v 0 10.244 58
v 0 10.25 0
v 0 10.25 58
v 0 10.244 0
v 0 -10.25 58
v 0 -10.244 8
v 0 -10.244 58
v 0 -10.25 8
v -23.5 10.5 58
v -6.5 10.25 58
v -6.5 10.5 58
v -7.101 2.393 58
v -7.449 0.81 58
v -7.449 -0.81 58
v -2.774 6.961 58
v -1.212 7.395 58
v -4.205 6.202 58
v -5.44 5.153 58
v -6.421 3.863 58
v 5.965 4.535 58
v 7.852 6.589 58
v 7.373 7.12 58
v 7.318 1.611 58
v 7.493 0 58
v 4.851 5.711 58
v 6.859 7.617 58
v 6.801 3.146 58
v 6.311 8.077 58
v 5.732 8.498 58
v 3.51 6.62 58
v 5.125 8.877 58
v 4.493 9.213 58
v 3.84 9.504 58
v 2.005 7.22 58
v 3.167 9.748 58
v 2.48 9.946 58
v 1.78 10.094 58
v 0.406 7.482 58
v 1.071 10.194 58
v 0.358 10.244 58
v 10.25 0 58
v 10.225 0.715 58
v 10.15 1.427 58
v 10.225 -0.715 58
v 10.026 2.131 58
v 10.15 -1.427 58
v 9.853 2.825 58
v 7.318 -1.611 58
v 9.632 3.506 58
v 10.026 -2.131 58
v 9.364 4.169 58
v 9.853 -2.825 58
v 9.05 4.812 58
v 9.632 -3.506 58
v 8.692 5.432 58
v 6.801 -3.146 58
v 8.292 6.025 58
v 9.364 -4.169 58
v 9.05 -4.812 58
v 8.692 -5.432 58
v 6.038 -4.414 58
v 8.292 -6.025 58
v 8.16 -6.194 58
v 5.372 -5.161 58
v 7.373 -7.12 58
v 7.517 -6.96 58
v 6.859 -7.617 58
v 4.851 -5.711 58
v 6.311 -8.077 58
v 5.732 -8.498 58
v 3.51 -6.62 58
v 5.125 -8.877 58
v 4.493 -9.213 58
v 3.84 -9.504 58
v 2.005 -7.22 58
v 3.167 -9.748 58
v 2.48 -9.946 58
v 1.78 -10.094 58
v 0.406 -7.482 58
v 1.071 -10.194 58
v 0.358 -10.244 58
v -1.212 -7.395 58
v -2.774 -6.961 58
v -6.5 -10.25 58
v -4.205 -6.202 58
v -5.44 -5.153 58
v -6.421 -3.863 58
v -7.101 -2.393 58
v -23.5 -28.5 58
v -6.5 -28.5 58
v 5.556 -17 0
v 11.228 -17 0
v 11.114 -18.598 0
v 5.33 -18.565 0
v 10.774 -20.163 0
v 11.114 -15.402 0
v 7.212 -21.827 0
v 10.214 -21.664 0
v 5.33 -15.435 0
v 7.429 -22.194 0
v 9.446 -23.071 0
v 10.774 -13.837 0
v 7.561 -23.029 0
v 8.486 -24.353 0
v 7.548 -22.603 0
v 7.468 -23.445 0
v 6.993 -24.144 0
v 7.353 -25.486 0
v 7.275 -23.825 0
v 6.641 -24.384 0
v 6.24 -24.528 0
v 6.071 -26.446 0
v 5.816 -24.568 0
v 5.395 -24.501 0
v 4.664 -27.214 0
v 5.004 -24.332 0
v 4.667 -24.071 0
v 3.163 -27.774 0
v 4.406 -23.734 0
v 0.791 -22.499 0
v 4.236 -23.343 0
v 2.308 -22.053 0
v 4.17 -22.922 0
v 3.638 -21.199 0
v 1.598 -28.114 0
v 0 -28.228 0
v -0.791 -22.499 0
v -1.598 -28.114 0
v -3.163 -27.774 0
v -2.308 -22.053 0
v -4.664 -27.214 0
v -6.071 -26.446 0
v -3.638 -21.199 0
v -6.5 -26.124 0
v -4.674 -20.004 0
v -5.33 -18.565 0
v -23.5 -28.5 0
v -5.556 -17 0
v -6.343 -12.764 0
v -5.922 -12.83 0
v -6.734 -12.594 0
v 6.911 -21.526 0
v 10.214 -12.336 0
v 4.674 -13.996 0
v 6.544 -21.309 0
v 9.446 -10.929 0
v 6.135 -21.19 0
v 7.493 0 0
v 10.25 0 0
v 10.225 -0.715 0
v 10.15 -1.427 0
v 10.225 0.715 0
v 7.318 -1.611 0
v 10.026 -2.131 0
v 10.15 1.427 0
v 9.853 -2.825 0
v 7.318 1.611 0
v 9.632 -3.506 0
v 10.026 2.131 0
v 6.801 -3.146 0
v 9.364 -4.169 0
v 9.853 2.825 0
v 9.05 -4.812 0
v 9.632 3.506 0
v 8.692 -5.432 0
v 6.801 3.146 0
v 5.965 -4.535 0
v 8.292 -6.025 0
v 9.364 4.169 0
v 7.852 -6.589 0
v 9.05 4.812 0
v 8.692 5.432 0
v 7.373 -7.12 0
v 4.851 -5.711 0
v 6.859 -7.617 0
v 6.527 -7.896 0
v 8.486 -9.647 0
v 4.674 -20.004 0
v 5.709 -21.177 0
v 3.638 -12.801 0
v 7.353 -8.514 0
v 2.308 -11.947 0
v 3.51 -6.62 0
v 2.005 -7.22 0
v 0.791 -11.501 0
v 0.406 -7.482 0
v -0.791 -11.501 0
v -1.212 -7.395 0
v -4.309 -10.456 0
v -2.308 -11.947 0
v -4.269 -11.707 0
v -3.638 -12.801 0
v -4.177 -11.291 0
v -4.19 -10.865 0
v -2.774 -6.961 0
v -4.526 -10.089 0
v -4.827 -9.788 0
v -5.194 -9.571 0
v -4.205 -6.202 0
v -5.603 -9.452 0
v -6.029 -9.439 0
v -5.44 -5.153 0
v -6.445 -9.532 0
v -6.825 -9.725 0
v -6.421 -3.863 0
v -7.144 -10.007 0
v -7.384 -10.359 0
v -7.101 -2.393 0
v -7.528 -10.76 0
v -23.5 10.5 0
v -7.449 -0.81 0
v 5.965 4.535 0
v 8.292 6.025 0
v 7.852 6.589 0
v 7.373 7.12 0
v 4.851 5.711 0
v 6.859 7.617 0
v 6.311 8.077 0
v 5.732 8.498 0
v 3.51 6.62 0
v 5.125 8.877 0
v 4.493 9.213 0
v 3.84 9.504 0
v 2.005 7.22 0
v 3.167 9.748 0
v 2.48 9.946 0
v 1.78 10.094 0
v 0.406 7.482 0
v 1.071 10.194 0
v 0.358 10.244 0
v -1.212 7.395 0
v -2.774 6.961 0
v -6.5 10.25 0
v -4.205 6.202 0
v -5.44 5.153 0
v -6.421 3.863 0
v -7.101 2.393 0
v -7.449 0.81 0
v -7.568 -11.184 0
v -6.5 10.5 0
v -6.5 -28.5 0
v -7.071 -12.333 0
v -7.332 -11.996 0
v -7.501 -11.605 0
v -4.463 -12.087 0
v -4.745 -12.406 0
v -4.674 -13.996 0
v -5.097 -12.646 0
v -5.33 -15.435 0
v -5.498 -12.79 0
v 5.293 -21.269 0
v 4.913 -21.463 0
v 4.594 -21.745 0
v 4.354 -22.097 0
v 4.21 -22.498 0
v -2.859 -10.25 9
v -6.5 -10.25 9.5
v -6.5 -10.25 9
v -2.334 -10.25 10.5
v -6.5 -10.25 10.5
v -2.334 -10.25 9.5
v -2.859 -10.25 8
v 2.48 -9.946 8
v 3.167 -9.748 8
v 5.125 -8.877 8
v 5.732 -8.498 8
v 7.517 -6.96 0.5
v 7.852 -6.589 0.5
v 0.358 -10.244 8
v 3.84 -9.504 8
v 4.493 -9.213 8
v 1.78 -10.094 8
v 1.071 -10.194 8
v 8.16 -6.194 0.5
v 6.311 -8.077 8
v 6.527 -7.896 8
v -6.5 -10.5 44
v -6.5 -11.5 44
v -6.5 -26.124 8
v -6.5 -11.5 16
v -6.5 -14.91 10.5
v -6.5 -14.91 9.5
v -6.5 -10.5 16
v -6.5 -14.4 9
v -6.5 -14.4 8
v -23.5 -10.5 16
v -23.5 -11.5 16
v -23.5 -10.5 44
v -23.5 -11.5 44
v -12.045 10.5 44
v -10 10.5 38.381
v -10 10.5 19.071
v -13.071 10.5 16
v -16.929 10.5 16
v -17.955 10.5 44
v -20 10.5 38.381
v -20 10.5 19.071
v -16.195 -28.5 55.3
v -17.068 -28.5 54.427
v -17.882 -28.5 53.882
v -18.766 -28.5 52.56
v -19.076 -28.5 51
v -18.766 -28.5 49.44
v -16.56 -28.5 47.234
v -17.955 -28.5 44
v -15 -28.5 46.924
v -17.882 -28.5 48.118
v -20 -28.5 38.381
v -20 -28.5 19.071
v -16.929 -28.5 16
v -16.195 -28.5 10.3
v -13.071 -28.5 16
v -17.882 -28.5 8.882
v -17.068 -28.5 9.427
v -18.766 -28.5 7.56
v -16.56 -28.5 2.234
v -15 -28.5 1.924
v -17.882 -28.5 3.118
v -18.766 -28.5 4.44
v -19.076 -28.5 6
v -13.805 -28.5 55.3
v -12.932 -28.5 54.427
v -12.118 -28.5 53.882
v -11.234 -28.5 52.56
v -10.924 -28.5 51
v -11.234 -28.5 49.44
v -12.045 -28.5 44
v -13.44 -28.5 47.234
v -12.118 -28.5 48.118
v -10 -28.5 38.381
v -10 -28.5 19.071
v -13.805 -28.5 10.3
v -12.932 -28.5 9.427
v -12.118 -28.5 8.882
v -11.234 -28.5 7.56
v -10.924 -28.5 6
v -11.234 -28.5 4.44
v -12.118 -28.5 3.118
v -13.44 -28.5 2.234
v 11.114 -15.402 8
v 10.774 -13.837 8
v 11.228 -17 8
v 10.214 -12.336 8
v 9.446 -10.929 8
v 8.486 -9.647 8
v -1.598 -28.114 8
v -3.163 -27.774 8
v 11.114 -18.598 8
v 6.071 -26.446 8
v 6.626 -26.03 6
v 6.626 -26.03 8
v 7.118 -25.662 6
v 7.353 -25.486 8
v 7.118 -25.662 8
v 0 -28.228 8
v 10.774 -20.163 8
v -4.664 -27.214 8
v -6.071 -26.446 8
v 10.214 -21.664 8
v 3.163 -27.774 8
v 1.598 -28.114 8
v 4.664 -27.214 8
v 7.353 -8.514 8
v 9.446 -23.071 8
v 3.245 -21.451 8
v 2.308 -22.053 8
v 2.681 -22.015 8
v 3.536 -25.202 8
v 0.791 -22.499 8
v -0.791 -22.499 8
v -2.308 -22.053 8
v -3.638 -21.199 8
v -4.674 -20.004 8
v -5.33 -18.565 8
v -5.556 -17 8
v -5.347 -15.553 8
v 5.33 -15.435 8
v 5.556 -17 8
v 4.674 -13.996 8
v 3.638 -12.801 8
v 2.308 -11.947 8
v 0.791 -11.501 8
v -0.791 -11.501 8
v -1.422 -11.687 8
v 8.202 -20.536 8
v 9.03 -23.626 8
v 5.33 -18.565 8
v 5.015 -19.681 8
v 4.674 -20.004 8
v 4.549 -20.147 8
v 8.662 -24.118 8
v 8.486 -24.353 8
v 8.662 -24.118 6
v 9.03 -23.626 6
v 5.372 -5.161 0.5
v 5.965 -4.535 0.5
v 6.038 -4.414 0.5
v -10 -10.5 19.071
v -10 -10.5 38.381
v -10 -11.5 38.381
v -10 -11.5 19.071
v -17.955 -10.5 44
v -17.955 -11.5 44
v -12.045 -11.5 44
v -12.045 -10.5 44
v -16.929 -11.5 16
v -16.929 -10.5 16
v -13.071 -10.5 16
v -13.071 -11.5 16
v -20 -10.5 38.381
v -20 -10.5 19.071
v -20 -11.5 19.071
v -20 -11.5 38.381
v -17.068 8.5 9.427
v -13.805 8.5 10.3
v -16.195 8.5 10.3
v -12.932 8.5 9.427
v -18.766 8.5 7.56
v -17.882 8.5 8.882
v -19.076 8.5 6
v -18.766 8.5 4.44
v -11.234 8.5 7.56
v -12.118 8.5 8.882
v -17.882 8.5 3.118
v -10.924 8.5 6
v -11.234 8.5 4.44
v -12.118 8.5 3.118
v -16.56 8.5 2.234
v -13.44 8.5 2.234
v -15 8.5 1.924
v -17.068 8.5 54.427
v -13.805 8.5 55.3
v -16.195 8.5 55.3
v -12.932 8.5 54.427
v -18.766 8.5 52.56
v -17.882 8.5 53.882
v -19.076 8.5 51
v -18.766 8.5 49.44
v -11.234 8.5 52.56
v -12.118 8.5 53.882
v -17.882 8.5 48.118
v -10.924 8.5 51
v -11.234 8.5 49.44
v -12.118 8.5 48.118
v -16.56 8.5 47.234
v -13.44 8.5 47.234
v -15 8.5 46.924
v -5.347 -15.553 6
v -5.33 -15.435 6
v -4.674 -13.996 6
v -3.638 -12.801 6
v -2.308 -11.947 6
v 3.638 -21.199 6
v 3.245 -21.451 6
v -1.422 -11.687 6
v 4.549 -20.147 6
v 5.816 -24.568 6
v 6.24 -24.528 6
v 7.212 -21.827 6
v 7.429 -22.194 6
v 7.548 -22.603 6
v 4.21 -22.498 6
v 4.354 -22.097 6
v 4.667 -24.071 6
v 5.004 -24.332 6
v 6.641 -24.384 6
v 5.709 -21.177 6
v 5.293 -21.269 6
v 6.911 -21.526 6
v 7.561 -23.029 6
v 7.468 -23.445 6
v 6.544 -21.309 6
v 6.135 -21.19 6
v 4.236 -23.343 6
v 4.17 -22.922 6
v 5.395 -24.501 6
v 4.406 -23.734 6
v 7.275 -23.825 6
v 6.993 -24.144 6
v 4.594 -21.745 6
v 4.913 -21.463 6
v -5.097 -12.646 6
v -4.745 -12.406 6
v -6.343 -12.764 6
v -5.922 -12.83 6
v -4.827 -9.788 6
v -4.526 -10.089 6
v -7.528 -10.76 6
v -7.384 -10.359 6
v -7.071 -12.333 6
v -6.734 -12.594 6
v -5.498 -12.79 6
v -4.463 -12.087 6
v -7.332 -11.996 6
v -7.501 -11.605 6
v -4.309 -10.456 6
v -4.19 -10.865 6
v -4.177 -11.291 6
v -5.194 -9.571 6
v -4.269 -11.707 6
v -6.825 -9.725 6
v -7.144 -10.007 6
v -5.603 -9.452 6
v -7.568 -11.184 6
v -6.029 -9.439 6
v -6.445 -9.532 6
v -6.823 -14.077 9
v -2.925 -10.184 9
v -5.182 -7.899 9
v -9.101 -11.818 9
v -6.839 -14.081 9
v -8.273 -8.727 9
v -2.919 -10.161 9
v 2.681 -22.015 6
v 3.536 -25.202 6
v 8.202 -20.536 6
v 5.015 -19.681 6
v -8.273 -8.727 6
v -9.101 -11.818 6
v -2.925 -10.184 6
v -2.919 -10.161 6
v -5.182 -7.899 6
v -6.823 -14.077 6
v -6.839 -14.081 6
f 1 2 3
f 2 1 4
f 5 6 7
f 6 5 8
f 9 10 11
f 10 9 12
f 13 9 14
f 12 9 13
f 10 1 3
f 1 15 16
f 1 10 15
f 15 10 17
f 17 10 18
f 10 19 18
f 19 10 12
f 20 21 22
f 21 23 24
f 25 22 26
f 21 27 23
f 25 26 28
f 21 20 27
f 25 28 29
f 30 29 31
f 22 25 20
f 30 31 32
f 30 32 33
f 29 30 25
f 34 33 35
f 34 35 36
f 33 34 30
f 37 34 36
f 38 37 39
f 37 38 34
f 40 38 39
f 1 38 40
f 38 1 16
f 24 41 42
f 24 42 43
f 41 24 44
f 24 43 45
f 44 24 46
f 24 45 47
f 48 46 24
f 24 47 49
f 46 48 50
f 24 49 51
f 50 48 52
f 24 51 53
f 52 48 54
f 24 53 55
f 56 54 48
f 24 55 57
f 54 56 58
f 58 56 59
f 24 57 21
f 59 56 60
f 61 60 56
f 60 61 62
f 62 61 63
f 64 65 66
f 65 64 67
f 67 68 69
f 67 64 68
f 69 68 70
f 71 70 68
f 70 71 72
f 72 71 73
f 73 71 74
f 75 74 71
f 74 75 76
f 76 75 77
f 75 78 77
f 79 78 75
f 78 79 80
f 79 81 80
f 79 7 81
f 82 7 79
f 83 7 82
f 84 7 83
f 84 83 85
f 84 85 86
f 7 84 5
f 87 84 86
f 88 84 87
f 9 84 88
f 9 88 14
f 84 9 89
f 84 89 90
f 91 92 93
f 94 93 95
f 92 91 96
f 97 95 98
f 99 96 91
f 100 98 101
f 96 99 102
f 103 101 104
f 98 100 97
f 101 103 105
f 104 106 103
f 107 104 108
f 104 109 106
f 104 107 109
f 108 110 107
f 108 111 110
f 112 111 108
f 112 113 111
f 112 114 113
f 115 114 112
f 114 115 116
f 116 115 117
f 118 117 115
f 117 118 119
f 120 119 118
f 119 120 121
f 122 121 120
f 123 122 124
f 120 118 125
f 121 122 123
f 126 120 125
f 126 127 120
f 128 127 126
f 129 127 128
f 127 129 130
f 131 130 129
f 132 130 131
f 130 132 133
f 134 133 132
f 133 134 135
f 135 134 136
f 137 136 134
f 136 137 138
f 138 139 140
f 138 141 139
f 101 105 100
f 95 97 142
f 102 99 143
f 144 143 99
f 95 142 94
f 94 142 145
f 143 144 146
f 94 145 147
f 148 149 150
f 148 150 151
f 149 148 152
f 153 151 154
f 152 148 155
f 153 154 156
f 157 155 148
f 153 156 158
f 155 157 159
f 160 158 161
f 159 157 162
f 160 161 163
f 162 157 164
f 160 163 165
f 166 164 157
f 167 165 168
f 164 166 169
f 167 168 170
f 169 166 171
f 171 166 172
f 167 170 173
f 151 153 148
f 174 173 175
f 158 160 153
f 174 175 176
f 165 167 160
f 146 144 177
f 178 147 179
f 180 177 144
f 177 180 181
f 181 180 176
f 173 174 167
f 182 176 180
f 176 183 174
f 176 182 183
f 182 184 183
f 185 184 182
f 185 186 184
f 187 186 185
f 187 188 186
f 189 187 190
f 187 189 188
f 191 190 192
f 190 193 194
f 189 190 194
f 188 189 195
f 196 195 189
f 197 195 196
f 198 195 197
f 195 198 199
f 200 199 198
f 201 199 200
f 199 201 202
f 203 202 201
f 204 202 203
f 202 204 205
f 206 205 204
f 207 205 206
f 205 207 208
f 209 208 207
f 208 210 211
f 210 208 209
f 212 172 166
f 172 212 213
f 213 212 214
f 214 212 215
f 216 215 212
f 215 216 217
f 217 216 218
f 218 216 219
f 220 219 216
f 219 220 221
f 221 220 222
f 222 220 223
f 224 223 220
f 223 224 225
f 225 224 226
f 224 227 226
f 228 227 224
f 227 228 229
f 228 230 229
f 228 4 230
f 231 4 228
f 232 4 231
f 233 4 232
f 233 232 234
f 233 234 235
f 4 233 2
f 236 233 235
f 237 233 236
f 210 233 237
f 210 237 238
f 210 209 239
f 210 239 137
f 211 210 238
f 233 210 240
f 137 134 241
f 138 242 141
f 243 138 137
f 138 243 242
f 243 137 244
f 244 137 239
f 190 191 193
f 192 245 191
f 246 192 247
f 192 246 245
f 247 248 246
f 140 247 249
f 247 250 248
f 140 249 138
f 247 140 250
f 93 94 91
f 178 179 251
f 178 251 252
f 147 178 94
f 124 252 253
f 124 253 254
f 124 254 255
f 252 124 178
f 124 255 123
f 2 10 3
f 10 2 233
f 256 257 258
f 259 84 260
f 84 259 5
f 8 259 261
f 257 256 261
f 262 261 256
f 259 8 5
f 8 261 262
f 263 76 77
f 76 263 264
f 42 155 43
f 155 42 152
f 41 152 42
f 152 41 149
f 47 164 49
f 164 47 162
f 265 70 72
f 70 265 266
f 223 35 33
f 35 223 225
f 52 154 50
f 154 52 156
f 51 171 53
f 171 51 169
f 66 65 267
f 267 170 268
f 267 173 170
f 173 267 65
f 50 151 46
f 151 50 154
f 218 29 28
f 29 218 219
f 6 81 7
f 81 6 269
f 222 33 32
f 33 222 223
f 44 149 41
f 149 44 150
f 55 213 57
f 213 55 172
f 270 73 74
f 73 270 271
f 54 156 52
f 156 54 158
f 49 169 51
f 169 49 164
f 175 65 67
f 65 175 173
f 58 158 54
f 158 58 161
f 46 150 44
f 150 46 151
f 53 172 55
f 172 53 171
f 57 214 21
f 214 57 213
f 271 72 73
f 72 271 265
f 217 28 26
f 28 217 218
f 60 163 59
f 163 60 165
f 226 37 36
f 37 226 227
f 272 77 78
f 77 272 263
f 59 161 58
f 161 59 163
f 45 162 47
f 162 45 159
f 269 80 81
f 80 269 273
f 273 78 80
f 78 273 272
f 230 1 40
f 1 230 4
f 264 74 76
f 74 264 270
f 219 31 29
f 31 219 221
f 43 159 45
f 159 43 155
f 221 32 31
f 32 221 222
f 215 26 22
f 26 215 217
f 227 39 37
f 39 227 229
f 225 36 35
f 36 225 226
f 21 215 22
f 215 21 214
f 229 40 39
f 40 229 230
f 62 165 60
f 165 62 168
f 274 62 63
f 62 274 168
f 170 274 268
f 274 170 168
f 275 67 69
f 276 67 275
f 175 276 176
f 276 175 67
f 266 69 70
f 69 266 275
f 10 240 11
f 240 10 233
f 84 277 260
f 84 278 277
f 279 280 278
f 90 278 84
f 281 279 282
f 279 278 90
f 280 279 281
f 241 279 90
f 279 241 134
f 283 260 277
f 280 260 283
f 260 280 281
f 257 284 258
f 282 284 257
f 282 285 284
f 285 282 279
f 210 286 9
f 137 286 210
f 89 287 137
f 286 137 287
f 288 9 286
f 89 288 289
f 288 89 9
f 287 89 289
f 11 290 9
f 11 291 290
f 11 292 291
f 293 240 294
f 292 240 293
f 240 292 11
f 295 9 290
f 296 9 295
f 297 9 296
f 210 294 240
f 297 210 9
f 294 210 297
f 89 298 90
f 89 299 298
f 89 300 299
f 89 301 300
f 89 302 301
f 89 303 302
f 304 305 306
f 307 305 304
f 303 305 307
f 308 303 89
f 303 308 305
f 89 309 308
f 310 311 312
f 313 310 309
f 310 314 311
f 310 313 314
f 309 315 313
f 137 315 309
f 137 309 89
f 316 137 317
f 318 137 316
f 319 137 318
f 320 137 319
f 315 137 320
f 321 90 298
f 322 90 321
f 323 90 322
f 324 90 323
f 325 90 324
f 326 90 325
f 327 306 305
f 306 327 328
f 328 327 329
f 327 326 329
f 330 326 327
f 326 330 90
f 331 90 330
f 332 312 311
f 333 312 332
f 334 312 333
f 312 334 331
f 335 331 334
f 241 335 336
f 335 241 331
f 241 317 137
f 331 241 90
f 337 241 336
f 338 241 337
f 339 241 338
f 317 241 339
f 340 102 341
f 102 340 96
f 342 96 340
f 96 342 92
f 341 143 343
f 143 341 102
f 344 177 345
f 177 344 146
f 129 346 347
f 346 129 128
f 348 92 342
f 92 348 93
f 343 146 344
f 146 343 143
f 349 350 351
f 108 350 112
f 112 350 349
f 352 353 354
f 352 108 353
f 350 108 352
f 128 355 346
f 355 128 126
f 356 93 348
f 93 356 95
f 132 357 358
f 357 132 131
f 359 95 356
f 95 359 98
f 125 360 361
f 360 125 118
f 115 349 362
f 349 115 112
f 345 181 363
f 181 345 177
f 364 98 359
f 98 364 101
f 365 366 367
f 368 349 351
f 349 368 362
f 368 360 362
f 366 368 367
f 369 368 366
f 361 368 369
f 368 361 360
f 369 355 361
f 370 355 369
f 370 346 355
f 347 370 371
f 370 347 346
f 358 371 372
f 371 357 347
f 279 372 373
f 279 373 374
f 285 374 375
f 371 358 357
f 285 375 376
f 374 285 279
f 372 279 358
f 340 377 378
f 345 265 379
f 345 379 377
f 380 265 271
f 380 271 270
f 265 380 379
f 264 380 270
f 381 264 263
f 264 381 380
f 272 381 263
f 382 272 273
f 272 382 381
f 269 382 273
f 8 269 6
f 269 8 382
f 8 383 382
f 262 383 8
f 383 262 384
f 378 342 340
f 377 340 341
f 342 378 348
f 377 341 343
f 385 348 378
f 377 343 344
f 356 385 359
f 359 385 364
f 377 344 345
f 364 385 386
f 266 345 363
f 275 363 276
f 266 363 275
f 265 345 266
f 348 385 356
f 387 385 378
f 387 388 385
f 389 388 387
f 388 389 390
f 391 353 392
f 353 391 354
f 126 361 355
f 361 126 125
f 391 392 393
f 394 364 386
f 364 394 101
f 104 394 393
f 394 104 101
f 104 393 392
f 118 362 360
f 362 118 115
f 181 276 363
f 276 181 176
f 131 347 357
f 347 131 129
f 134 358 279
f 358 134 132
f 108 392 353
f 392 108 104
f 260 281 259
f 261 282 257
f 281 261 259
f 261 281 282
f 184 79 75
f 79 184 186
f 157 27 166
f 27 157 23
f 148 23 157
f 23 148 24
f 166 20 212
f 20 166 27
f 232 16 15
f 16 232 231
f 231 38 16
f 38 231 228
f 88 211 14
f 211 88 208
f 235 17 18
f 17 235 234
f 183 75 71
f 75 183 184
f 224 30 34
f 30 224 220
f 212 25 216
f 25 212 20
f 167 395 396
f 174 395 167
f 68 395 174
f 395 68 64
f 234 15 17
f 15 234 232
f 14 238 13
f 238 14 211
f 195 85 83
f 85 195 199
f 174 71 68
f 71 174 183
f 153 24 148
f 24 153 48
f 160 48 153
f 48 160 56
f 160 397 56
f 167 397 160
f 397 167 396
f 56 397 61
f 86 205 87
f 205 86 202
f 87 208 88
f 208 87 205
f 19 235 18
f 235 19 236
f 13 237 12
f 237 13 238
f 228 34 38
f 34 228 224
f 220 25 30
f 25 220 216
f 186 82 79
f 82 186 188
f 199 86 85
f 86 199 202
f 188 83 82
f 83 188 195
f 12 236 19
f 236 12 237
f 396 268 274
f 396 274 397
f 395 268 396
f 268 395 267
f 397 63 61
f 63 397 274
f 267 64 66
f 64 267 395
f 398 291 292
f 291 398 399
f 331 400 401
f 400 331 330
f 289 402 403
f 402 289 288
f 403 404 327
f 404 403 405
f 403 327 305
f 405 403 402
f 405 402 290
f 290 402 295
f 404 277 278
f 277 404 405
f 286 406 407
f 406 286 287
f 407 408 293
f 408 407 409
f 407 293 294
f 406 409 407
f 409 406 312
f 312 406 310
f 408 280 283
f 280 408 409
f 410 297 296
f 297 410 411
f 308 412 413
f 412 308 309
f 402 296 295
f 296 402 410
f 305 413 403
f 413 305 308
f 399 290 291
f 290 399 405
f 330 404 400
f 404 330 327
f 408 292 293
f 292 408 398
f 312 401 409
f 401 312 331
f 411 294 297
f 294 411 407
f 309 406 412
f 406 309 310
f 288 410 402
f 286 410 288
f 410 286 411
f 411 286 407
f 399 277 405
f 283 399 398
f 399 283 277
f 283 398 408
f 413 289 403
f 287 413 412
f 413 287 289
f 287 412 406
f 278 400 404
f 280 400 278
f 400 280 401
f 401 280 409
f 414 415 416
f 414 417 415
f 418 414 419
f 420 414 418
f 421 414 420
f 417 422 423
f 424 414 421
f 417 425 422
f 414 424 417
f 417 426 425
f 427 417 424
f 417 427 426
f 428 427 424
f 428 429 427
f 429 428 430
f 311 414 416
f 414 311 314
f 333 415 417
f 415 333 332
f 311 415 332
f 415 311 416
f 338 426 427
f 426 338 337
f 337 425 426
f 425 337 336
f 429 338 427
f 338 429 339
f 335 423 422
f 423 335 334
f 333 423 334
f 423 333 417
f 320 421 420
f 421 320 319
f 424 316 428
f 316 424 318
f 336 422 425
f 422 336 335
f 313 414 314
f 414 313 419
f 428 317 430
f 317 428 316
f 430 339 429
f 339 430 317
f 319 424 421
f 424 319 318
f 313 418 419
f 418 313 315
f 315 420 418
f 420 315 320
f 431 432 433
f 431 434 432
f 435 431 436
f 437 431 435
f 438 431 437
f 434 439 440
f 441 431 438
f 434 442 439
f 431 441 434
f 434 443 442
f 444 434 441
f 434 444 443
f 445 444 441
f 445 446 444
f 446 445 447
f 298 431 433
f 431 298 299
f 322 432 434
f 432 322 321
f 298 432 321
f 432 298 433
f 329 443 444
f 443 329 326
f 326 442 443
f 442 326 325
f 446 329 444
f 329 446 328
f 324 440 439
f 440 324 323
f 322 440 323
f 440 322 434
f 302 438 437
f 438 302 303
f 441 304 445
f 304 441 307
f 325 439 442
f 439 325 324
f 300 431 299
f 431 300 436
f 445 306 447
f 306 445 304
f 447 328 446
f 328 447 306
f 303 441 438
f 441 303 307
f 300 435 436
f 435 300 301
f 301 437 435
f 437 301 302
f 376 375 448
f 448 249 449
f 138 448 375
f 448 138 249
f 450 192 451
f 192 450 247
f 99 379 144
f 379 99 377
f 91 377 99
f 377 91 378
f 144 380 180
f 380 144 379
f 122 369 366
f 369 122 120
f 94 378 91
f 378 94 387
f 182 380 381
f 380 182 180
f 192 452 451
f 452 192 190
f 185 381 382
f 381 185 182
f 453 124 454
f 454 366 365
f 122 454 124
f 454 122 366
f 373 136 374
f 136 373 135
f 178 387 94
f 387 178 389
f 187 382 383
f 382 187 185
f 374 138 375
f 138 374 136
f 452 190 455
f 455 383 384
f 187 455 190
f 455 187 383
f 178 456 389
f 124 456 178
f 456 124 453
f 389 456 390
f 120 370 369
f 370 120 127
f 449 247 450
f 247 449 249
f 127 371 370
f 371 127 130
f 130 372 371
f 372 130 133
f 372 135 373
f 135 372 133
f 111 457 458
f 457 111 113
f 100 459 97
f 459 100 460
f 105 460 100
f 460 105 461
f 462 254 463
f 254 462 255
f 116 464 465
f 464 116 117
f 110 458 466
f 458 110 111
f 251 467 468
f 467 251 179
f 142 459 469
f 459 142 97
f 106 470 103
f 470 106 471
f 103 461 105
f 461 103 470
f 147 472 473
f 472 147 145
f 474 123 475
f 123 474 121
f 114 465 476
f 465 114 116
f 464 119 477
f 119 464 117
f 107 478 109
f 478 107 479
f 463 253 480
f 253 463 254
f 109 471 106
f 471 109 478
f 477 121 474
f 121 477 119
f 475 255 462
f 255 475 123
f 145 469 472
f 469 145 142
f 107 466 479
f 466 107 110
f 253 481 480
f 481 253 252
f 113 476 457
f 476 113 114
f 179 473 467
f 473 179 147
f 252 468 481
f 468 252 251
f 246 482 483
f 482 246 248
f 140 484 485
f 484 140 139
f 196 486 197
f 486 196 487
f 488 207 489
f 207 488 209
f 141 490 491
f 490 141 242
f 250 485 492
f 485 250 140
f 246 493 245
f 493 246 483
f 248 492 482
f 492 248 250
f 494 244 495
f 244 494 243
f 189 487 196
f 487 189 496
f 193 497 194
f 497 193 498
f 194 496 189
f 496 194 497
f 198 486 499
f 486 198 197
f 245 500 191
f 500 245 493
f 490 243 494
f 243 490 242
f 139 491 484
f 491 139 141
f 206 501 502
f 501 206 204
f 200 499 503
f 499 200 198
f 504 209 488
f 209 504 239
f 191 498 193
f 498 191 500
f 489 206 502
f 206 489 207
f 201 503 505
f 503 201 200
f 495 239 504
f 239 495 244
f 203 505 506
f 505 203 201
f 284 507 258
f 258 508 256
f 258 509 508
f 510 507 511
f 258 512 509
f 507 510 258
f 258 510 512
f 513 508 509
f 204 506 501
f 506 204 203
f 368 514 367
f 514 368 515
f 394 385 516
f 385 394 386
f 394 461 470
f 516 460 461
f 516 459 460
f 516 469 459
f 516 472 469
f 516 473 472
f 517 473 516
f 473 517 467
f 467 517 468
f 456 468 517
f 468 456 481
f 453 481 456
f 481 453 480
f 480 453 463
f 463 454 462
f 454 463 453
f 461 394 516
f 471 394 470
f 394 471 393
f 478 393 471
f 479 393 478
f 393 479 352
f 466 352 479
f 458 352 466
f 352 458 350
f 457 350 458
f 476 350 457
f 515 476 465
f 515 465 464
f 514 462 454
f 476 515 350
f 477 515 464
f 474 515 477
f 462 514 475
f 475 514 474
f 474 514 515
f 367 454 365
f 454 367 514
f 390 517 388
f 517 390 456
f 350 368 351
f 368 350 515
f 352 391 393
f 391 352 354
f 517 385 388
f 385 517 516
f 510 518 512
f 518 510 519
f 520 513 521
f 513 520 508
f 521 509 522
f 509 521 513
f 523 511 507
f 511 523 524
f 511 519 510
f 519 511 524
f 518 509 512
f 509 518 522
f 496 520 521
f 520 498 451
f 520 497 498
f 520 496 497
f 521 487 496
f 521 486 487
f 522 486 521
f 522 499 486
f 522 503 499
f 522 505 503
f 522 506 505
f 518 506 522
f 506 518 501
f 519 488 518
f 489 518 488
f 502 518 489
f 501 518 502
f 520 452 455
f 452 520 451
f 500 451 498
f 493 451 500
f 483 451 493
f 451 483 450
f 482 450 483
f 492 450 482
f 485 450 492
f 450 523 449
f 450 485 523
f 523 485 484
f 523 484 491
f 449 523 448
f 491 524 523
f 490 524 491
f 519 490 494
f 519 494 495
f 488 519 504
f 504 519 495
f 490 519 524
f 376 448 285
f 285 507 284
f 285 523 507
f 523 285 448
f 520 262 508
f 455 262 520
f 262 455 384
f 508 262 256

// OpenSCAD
// file: polyholes.scad
//Original Prusa

//
// Mendel90
//
// GNU GPL v2
// nop.head@gmail.com
// hydraraptor.blogspot.com
//
// See http://hydraraptor.blogspot.com/2011/02/polyholes.html
//
function sides(r) = max(round(4 *r),3);
function correctedRadius(r,n) = 0.1 + r / cos(180 / n);
function correctedDiameter(d) = 0.2 + d / cos(180 / sides(d / 2));

module polyCircle(r, center = false) {
    n = sides(r);
    circle(r = correctedRadius(r,n), $fn = n, center = center);
}

module poly_circle(r, center = false) {
	polyCircle(r, center);
}

module polyCylinder(r, h, center = false) {
    n = sides(r);
    cylinder(h = h, r = correctedRadius(r,n), $fn = n, center = center);
}

module poly_cylinder(r, h, center = false) {
	polyCylinder(r,h,center);
}

module polydCylinder(r, center = false) {
    n = sides(r);
    r = correctedRadius(r,n);
    cylinder(h = h, r = r, $fn = n, center = center);
    translate([0, -r, 0])
        cube([r, 2 * r, h]);
}

module poly_d_cylinder(r, center = false) {
	polydCylinder(r,center);
}
// file: bearing.scad
//Original Prusa

// PRUSA iteration3
// Bearing holders
// GNU GPL v3
// Josef Průša <iam@josefprusa.cz> and contributors
// http://www.reprap.org/wiki/Prusa_Mendel
// http://prusamendel.org

use <polyholes.scad>

bearing_diameter = 14.5;

module horizontal_bearing_base(bearings=1){
 translate(v=[0,0,6]) cube(size = [24,8+bearings*25,12], center = true);	
}
module horizontal_bearing_holes(bearings=1){
 cutter_lenght = 10+bearings*25;
 one_holder_lenght = 8+25;
 holder_lenght = 8+bearings*25;
 
 // Main bearing cut
 difference(){
  translate(v=[0,0,12]) rotate(a=[90,0,0]) translate(v=[0,0,-cutter_lenght/2]) cylinder(h = cutter_lenght, r=(bearing_diameter/2)+0.2, $fn=50);
  // Bearing retainers
  translate(v=[0,1-holder_lenght/2,3]) cube(size = [24,6,8], center = true);
  translate(v=[0,-1+holder_lenght/2,3]) cube(size = [24,6,8], center = true);
 }
 
 // Ziptie cutouts
 ziptie_cut_ofset = 0;
 for ( i = [0 : bearings-1] ){
  // For easier positioning I move them by half of one 
  // bearing holder then add each bearign lenght and then center again
  translate(v=[0,-holder_lenght/2,0]) translate(v=[0,one_holder_lenght/2+i*25,0]) difference(){
   union(){
    translate(v=[0,2-8.5,12]) rotate(a=[90,0,0]) translate(v=[0,0,0]) cylinder(h = 4, r=11.5, $fn=50);
    translate(v=[0,2+8.5,12]) rotate(a=[90,0,0]) translate(v=[0,0,0]) cylinder(h = 4, r=11.5, $fn=50);
   }
   translate(v=[0,12,12]) rotate(a=[90,0,0]) translate(v=[0,0,0]) cylinder(h = 24, r=9, $fn=50);
  }
 }
 
}

module horizontal_bearing_test(){
 difference(){
  horizontal_bearing_base(1);
  horizontal_bearing_holes(1);
 }
 translate(v=[30,0,0]) difference(){
  horizontal_bearing_base(2);
  #horizontal_bearing_holes(2);
 }
 translate(v=[60,0,0]) difference(){
  horizontal_bearing_base(3);
  horizontal_bearing_holes(3);
 }
}



thinwall = 3;
bearing_size = bearing_diameter + 2 * thinwall;

module vertical_bearing_base(){
 translate(v=[-2-bearing_size/4,0,29]) cube(size = [4+bearing_size/2,bearing_size,58], center = true);
 cylinder(h = 58, r=bearing_size/2, $fn = 90);
}

module vertical_bearing_holes(){
  translate(v=[0,0,-1]) poly_cylinder(h = 62, r=(bearing_diameter/2)+0.1);
  rotate(a=[0,0,-40]) translate(v=[bearing_diameter/2-2.9,-0.5,0.5]) cube(size = [thinwall*2,1,62]);

}

//difference(){
vertical_bearing_base();
vertical_bearing_holes();
//}
//horizontal_bearing_test();
//horizontal_bearing_base(1);
//horizontal_bearing_holes(1);
// main file
//Carbon i3 Modified

// PRUSA iteration3
// X end prototype
// GNU GPL v3
// Josef Průša <iam@josefprusa.cz> and contributors
// http://www.reprap.org/wiki/Prusa_Mendel
// http://prusamendel.org

use <bearing.scad>
use <polyholes.scad>
rod_distance = 45;

raio_interno_porca = 5.4;
raio_externo_porca = 11.1;
raio_furos_porca = 8.3;
raio_furos_parafusos = 1.7;

module x_end_base(){
// Main block
height = 58;
translate(v=[-15,-9,height/2]) cube(size = [17,39,height], center = true);
// Bearing holder
 vertical_bearing_base();	
//Nut trap
 // Cylinder
   //translate(v=[0,-17,0]) poly_cylinder(h = 8, r=12.5, $fn=25);
    //translate(v=[0,-17,0]) poly_cylinder(h = 8, r=12.5-offset_furo_porca, $fn=25);
    translate(v=[0,-17,0]) poly_cylinder(h = 8, r=raio_externo_porca, $fn=25);
 // Hexagon
 //translate(v=[0,-17,0]) rotate([0,0,30]) cylinder(h = 8, r=8, $fn = 6);
translate(v=[-6,-10.6,10]) rotate([0,0,48.2]) cube(size = [10,5,1], center = true);
}

module x_end_holes(){
 vertical_bearing_holes();
// Belt hole
translate(v=[-1,0,0]){
// Stress relief
translate(v=[-5.5-10+1.5,-10-1,30]) cube(size = [18,1,28], center = true);
difference(){
	translate(v=[-5.5-10+1.5,-10,30]) cube(size = [10,46,28], center = true);

	

	// Nice edges
	translate(v=[-5.5-10+1.5-5,-10,30+23]) rotate([0,20,0]) cube(size = [10,46,28], center = true);
	translate(v=[-5.5-10+1.5+5,-10,30+23]) rotate([0,-20,0]) cube(size = [10,46,28], center = true);
	translate(v=[-5.5-10+1.5,-10,30-23]) rotate([0,45,0]) cube(size = [10,46,28], center = true);
	translate(v=[-5.5-10+1.5,-10,30-23]) rotate([0,-45,0]) cube(size = [10,46,28], center = true);

}
}

// Bottom pushfit rod
translate(v=[-15,-41.5,6]) rotate(a=[-90,0,0]) pushfit_rod(7.8,50);
// Top pushfit rod
translate(v=[-15,-41.5,rod_distance+6]) rotate(a=[-90,0,0]) pushfit_rod(7.8,50);

// TR Nut trap
   // Hole for the nut
    //translate(v=[0,-17, -1]) poly_cylinder(h = 9.01, r = 6.6, $fn = 25); //  Bruno
    translate(v=[0,-17, -1]) poly_cylinder(h = 9.01, r = raio_interno_porca, $fn = 25); //  Bruno

// Screw holes for TR nut
    //translate(v=[0,-17, 0]) rotate([0, 0, -135]) translate([0, 9.5, -1]) cylinder(h = 10, r = 1.55, $fn=25);
    translate(v=[0,-17, 0]) rotate([0, 0, -135]) translate([0, raio_furos_porca, -1]) cylinder(h = 10, r = raio_furos_parafusos, $fn=25); // Bruno

    //translate(v=[0,-17, 0]) rotate([0, 0, -135]) translate([0, -9.5, -1]) cylinder(h = 10, r = 1.55, $fn=25);
    translate(v=[0,-17, 0]) rotate([0, 0, -135]) translate([0, -raio_furos_porca, -1]) cylinder(h = 10, r = raio_furos_parafusos, $fn=25); // Bruno

// Nut traps for TR nut screws
    //translate(v=[0,-17, 0]) rotate([0, 0, -135]) translate([0, 9.5, 6]) rotate([0, 0, 0])cylinder(h = 3, r = 3.3, $fn=6);
    translate(v=[0,-17, 0]) rotate([0, 0, -135]) translate([0, raio_furos_porca, 6]) rotate([0, 0, 0])cylinder(h = 3, r = 3.3, $fn=6); // Bruno
    
    //translate(v=[0,-17, 0]) rotate([0, 0, -135]) translate([0, -9.5, 6]) rotate([0, 0, 30])cylinder(h = 3, r = 3.2, $fn=6);
    translate(v=[0,-17, 0]) rotate([0, 0, -135]) translate([0, -raio_furos_porca-0.2, 6]) rotate([0, 0, 30])cylinder(h = 3, r = 3.2, $fn=6); // Bruno
    
    //translate([-5.5,-17.2,6]) rotate([0,0,30]) cube([5,5,3]);
    translate([-3.70,-17.2,6]) rotate([0,0,45]) cube([5,5,3]); // Bruno
    
    //translate([-0,-17.2,6]) rotate([0,0,60]) cube([5,10,3]);
    translate([-0,-20.18,6]) rotate([0,0,45]) cube([5,10,3]); // Bruno
}


// Final prototype
module x_end_plain(){
 difference(){
  x_end_base();
  x_end_holes();
 }
}

x_end_plain();


module pushfit_rod(diameter,length){
 poly_cylinder(h = length, r=diameter/2);
 difference(){
 	translate(v=[0,-diameter/2.85,length/2]) rotate([0,0,45]) cube(size = [diameter/2,diameter/2,length], center = true);
 	translate(v=[0,-diameter/4-diameter/2-0.4,length/2]) rotate([0,0,0]) cube(size = [diameter,diameter/2,length], center = true);
 }
 //translate(v=[0,-diameter/2-2,length/2]) cube(size = [diameter,1,length], center = true);
}
